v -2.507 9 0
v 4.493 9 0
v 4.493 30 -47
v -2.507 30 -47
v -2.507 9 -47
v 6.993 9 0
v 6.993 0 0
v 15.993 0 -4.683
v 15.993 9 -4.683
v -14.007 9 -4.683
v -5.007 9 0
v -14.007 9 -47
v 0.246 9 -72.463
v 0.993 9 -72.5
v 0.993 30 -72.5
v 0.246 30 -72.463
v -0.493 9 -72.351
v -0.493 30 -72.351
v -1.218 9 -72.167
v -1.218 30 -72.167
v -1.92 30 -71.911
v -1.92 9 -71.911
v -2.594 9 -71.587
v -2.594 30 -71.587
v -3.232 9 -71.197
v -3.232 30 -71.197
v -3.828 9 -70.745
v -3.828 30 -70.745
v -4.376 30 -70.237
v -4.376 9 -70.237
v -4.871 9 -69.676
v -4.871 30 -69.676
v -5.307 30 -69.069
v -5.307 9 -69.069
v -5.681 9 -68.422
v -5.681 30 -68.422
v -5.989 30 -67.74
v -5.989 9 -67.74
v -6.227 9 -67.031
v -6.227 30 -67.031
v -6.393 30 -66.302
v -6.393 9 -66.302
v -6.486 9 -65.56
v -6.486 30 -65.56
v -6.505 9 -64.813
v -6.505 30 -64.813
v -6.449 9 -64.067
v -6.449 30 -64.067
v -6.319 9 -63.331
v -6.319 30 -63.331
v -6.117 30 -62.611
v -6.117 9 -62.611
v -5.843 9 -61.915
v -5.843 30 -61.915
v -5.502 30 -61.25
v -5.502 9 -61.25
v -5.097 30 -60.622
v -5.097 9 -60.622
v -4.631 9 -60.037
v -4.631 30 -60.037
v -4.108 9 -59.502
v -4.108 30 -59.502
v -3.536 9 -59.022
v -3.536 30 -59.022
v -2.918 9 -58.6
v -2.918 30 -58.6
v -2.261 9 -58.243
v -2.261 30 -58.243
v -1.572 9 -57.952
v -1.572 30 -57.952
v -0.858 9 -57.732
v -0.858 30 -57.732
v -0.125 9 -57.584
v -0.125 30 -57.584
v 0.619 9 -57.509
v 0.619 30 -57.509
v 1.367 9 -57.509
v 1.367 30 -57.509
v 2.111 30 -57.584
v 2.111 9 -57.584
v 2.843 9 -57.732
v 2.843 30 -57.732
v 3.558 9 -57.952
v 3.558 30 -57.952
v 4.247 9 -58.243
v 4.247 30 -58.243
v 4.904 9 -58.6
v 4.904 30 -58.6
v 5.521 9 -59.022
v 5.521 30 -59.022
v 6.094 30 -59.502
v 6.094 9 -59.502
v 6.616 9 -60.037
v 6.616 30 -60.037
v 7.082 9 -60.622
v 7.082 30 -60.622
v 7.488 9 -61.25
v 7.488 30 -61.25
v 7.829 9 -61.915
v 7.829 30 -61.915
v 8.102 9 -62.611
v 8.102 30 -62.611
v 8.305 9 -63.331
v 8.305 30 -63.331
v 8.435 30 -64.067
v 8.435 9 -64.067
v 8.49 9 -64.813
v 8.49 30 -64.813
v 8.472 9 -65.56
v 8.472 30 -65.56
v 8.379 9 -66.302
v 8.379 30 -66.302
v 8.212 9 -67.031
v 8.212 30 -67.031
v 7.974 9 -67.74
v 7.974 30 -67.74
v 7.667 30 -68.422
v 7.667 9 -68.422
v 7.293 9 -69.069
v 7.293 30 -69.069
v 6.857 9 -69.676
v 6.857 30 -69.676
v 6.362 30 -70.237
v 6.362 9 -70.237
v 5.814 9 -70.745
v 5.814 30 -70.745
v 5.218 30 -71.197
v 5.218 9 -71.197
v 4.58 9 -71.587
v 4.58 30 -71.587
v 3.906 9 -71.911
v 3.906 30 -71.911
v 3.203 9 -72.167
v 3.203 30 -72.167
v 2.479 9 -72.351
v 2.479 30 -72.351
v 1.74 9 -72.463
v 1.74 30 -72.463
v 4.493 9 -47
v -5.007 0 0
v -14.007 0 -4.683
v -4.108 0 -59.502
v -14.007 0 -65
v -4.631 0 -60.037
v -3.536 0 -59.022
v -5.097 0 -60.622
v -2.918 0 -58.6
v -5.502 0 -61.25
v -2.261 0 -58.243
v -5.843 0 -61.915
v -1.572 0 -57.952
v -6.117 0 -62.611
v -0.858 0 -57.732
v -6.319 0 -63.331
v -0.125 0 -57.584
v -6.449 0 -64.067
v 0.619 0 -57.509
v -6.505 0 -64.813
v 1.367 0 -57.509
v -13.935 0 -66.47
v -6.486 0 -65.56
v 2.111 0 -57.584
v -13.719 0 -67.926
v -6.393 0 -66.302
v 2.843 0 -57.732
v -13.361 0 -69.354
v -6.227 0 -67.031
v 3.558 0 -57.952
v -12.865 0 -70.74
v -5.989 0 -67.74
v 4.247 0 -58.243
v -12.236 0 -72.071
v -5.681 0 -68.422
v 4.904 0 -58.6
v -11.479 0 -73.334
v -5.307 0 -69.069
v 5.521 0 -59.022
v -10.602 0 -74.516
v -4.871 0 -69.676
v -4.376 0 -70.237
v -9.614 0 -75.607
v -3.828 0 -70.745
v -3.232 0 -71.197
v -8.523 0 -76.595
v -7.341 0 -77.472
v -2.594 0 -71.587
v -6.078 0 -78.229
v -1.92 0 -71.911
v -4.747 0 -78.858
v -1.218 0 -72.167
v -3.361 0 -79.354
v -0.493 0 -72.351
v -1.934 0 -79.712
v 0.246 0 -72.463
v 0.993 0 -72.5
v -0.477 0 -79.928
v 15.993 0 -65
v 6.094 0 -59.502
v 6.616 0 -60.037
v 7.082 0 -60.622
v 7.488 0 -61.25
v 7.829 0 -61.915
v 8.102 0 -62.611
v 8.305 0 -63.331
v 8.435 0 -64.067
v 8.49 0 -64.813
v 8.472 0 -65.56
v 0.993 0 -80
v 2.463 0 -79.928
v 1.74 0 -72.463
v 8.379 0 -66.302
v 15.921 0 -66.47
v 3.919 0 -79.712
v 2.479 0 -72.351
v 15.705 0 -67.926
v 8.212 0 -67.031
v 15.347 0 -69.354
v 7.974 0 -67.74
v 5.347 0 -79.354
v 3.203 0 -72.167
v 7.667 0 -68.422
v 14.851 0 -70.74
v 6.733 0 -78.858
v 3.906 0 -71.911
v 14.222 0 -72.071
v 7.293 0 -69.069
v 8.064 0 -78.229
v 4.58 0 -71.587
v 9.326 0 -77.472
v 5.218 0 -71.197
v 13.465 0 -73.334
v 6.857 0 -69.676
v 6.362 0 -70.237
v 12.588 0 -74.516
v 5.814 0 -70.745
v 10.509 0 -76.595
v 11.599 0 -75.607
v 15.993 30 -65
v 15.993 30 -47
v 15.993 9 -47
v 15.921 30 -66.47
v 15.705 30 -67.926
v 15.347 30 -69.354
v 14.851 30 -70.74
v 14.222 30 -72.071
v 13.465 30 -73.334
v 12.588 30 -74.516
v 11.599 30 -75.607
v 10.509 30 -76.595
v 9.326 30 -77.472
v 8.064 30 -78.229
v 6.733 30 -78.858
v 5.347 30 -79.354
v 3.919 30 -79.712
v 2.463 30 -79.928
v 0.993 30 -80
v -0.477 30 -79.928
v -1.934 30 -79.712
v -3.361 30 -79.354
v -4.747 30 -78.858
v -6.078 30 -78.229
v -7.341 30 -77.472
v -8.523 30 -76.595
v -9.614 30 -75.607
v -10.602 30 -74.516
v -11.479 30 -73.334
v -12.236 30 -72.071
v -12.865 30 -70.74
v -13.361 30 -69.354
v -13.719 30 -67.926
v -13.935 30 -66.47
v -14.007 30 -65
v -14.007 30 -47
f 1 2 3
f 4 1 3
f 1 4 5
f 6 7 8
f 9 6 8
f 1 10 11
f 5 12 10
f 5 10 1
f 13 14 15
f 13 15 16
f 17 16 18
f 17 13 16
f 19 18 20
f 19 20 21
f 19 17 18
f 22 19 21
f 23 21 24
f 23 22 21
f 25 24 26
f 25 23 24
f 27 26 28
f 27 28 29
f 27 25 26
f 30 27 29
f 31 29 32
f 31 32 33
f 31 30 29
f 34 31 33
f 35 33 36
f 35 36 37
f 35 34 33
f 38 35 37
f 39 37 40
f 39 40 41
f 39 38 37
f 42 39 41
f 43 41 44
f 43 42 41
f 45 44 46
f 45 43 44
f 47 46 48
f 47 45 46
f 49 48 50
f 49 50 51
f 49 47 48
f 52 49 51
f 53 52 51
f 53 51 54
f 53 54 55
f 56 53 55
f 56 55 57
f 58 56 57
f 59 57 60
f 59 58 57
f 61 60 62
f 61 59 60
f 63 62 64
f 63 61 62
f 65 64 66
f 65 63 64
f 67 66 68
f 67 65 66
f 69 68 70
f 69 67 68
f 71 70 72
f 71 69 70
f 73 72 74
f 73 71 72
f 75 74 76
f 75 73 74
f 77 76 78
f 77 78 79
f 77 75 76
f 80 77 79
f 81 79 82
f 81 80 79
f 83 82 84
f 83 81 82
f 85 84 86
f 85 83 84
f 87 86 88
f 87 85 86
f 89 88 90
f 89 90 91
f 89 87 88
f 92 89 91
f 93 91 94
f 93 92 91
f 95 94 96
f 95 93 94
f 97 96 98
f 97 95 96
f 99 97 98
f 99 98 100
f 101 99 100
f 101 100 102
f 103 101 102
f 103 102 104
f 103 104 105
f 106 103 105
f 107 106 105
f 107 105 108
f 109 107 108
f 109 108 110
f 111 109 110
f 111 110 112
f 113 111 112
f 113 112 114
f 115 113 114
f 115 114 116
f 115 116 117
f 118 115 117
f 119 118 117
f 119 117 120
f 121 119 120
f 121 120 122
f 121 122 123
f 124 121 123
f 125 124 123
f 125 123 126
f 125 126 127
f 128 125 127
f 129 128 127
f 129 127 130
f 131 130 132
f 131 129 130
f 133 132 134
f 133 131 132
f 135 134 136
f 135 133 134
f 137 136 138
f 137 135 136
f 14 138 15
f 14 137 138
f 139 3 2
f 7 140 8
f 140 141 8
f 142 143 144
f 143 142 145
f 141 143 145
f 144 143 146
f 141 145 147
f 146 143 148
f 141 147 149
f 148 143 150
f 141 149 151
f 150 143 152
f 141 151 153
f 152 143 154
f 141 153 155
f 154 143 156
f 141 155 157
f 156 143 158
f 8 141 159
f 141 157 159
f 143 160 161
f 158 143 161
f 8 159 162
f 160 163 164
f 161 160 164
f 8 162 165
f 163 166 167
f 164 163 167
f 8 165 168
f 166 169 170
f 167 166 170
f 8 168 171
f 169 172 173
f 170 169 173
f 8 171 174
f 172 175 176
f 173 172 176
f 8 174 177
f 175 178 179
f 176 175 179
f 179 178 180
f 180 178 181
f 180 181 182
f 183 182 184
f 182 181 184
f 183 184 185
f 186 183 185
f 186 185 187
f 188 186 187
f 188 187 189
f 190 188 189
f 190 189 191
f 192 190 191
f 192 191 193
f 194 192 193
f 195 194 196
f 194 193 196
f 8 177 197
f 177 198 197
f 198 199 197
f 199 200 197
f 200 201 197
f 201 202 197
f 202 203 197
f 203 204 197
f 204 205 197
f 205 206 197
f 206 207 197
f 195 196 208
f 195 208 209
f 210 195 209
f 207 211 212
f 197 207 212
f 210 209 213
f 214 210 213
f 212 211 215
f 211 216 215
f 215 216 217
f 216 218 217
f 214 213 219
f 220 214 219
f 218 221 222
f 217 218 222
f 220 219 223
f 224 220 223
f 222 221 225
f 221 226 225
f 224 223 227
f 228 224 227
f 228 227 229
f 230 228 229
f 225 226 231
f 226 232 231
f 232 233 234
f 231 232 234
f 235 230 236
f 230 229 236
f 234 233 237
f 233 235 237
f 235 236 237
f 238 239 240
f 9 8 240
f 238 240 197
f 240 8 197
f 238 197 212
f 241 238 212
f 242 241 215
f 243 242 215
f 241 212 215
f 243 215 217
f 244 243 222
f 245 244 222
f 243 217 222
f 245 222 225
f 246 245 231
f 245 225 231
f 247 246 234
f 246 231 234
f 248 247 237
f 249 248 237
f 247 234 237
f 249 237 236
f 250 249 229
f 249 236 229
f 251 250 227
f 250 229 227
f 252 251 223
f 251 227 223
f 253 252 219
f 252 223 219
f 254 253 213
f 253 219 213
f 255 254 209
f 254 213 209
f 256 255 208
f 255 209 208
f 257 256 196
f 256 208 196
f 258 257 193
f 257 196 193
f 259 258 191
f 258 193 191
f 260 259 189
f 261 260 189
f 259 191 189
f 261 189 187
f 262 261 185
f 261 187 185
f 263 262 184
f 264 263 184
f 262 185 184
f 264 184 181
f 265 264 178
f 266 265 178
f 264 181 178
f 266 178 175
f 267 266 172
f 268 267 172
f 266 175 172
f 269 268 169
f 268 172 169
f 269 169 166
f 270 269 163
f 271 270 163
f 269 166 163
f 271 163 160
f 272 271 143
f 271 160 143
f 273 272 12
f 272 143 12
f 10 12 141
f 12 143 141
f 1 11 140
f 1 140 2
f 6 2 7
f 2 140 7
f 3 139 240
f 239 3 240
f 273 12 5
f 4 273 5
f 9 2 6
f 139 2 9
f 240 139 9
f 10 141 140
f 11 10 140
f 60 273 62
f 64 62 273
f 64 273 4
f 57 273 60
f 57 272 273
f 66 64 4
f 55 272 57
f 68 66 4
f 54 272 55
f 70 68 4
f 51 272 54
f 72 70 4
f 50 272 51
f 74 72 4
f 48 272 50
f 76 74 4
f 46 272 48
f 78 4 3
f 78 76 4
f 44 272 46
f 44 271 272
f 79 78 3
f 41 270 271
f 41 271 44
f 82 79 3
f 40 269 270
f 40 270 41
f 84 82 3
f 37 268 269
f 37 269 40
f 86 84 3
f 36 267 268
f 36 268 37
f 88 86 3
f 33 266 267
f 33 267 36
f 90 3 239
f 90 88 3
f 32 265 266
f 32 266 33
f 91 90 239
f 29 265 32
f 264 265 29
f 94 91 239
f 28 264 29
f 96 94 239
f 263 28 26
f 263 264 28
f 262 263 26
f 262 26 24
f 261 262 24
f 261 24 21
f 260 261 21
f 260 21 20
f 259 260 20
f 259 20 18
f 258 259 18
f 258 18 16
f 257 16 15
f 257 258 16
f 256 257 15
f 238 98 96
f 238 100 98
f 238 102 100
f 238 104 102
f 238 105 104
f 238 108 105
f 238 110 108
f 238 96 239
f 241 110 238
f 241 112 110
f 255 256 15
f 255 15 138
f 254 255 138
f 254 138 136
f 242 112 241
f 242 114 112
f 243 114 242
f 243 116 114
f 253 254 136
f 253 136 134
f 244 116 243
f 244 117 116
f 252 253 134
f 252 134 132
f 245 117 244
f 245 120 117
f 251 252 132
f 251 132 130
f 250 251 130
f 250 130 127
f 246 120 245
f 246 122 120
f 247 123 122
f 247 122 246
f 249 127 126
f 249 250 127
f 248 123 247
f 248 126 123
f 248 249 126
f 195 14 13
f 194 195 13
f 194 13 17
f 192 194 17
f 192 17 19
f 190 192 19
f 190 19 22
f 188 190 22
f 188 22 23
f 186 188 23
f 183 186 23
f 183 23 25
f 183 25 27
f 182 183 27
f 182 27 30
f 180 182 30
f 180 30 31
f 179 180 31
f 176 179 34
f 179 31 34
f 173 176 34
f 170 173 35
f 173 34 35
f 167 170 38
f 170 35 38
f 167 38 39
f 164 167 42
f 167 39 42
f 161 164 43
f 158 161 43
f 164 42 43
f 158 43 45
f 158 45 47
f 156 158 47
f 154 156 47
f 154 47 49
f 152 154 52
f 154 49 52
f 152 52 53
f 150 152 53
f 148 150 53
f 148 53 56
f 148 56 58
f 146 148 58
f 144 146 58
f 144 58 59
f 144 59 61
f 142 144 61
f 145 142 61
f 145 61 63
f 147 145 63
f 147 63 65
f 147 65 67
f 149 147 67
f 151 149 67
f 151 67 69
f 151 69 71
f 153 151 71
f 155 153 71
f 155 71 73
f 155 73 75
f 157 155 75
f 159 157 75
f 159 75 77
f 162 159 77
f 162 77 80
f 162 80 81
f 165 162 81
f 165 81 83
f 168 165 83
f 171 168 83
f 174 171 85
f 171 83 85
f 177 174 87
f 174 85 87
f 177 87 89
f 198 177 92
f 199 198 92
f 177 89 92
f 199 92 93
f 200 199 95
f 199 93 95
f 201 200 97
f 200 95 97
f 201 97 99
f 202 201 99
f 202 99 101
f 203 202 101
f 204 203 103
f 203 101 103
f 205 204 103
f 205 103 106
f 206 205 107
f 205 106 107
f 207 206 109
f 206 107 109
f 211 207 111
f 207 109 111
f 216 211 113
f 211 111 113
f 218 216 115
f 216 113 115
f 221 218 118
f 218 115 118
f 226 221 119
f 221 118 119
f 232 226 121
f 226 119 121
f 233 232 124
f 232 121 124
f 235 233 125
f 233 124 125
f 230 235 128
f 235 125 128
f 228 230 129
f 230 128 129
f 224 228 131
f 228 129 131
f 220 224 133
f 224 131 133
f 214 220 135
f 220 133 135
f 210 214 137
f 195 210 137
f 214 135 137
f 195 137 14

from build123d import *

# Parameters (mm, degrees)
BOSS_EXTRUDE1_DEPTH = 9
SKETCH2_R           = 7.5
BOSS_EXTRUDE2_DEPTH = 21
BOSS_EXTRUDE3_DEPTH = 3.5
SKETCH4_R           = 7.5
CUT_EXTRUDE1_DEPTH  = 85.242328054


with BuildPart() as part:
    # Sketch1 → Boss-Extrude1 (new body)
    with BuildSketch(Plane(origin=(0, 0, 0), x_dir=(1, 0, 0), z_dir=(0, 1, 0))):
        with BuildLine():
            Line((-5.007194245, 0), (6.992805755, 0))
            Line((6.992805755, 0), (15.992805755, 4.683453237))
            Line((15.992805755, 4.683453237), (15.992805755, 65))
            ThreePointArc((15.992805755, 65), (0.992805755, 80), (-14.007194245, 65))
            Line((-14.007194245, 65), (-14.007194245, 4.683453237))
            Line((-14.007194245, 4.683453237), (-5.007194245, 0))
        make_face()
    extrude(amount=BOSS_EXTRUDE1_DEPTH)

    # Sketch2 → Boss-Extrude2 (add)
    with BuildSketch(Plane(origin=(0, 9, 0), x_dir=(1, 0, 0), z_dir=(0, 1, 0))):
        with BuildLine():
            ThreePointArc((15.992805755, 65), (0.992805755, 80), (-14.007194245, 65))
            Line((-14.007194245, 65), (-14.007194245, 47))
            Line((-14.007194245, 47), (15.992805755, 47))
            Line((15.992805755, 47), (15.992805755, 65))
        make_face()
        with Locations(Location((0.992805755, 65, 0), (0, 0, 90))):
            Circle(SKETCH2_R, mode=Mode.SUBTRACT)
    extrude(amount=BOSS_EXTRUDE2_DEPTH)

    # Sketch3 → Boss-Extrude3 (add, symmetric)
    with BuildSketch(Plane(origin=(0.992805755, 0, 0), x_dir=(0, 0, -1), z_dir=(1, 0, 0))):
        Polygon((0, 9), (47, 30), (47, 9), align=None)
    extrude(amount=BOSS_EXTRUDE3_DEPTH, both=True)

    # Sketch4 → Cut-Extrude1 (cut, through all)
    with BuildSketch(Plane(origin=(0, 9, 0), x_dir=(1, 0, 0), z_dir=(0, 1, 0))):
        with Locations(Location((0.992805755, 65, 0), (0, 0, 90))):
            Circle(SKETCH4_R)
    extrude(amount=-CUT_EXTRUDE1_DEPTH, mode=Mode.SUBTRACT)


solid = part.part
